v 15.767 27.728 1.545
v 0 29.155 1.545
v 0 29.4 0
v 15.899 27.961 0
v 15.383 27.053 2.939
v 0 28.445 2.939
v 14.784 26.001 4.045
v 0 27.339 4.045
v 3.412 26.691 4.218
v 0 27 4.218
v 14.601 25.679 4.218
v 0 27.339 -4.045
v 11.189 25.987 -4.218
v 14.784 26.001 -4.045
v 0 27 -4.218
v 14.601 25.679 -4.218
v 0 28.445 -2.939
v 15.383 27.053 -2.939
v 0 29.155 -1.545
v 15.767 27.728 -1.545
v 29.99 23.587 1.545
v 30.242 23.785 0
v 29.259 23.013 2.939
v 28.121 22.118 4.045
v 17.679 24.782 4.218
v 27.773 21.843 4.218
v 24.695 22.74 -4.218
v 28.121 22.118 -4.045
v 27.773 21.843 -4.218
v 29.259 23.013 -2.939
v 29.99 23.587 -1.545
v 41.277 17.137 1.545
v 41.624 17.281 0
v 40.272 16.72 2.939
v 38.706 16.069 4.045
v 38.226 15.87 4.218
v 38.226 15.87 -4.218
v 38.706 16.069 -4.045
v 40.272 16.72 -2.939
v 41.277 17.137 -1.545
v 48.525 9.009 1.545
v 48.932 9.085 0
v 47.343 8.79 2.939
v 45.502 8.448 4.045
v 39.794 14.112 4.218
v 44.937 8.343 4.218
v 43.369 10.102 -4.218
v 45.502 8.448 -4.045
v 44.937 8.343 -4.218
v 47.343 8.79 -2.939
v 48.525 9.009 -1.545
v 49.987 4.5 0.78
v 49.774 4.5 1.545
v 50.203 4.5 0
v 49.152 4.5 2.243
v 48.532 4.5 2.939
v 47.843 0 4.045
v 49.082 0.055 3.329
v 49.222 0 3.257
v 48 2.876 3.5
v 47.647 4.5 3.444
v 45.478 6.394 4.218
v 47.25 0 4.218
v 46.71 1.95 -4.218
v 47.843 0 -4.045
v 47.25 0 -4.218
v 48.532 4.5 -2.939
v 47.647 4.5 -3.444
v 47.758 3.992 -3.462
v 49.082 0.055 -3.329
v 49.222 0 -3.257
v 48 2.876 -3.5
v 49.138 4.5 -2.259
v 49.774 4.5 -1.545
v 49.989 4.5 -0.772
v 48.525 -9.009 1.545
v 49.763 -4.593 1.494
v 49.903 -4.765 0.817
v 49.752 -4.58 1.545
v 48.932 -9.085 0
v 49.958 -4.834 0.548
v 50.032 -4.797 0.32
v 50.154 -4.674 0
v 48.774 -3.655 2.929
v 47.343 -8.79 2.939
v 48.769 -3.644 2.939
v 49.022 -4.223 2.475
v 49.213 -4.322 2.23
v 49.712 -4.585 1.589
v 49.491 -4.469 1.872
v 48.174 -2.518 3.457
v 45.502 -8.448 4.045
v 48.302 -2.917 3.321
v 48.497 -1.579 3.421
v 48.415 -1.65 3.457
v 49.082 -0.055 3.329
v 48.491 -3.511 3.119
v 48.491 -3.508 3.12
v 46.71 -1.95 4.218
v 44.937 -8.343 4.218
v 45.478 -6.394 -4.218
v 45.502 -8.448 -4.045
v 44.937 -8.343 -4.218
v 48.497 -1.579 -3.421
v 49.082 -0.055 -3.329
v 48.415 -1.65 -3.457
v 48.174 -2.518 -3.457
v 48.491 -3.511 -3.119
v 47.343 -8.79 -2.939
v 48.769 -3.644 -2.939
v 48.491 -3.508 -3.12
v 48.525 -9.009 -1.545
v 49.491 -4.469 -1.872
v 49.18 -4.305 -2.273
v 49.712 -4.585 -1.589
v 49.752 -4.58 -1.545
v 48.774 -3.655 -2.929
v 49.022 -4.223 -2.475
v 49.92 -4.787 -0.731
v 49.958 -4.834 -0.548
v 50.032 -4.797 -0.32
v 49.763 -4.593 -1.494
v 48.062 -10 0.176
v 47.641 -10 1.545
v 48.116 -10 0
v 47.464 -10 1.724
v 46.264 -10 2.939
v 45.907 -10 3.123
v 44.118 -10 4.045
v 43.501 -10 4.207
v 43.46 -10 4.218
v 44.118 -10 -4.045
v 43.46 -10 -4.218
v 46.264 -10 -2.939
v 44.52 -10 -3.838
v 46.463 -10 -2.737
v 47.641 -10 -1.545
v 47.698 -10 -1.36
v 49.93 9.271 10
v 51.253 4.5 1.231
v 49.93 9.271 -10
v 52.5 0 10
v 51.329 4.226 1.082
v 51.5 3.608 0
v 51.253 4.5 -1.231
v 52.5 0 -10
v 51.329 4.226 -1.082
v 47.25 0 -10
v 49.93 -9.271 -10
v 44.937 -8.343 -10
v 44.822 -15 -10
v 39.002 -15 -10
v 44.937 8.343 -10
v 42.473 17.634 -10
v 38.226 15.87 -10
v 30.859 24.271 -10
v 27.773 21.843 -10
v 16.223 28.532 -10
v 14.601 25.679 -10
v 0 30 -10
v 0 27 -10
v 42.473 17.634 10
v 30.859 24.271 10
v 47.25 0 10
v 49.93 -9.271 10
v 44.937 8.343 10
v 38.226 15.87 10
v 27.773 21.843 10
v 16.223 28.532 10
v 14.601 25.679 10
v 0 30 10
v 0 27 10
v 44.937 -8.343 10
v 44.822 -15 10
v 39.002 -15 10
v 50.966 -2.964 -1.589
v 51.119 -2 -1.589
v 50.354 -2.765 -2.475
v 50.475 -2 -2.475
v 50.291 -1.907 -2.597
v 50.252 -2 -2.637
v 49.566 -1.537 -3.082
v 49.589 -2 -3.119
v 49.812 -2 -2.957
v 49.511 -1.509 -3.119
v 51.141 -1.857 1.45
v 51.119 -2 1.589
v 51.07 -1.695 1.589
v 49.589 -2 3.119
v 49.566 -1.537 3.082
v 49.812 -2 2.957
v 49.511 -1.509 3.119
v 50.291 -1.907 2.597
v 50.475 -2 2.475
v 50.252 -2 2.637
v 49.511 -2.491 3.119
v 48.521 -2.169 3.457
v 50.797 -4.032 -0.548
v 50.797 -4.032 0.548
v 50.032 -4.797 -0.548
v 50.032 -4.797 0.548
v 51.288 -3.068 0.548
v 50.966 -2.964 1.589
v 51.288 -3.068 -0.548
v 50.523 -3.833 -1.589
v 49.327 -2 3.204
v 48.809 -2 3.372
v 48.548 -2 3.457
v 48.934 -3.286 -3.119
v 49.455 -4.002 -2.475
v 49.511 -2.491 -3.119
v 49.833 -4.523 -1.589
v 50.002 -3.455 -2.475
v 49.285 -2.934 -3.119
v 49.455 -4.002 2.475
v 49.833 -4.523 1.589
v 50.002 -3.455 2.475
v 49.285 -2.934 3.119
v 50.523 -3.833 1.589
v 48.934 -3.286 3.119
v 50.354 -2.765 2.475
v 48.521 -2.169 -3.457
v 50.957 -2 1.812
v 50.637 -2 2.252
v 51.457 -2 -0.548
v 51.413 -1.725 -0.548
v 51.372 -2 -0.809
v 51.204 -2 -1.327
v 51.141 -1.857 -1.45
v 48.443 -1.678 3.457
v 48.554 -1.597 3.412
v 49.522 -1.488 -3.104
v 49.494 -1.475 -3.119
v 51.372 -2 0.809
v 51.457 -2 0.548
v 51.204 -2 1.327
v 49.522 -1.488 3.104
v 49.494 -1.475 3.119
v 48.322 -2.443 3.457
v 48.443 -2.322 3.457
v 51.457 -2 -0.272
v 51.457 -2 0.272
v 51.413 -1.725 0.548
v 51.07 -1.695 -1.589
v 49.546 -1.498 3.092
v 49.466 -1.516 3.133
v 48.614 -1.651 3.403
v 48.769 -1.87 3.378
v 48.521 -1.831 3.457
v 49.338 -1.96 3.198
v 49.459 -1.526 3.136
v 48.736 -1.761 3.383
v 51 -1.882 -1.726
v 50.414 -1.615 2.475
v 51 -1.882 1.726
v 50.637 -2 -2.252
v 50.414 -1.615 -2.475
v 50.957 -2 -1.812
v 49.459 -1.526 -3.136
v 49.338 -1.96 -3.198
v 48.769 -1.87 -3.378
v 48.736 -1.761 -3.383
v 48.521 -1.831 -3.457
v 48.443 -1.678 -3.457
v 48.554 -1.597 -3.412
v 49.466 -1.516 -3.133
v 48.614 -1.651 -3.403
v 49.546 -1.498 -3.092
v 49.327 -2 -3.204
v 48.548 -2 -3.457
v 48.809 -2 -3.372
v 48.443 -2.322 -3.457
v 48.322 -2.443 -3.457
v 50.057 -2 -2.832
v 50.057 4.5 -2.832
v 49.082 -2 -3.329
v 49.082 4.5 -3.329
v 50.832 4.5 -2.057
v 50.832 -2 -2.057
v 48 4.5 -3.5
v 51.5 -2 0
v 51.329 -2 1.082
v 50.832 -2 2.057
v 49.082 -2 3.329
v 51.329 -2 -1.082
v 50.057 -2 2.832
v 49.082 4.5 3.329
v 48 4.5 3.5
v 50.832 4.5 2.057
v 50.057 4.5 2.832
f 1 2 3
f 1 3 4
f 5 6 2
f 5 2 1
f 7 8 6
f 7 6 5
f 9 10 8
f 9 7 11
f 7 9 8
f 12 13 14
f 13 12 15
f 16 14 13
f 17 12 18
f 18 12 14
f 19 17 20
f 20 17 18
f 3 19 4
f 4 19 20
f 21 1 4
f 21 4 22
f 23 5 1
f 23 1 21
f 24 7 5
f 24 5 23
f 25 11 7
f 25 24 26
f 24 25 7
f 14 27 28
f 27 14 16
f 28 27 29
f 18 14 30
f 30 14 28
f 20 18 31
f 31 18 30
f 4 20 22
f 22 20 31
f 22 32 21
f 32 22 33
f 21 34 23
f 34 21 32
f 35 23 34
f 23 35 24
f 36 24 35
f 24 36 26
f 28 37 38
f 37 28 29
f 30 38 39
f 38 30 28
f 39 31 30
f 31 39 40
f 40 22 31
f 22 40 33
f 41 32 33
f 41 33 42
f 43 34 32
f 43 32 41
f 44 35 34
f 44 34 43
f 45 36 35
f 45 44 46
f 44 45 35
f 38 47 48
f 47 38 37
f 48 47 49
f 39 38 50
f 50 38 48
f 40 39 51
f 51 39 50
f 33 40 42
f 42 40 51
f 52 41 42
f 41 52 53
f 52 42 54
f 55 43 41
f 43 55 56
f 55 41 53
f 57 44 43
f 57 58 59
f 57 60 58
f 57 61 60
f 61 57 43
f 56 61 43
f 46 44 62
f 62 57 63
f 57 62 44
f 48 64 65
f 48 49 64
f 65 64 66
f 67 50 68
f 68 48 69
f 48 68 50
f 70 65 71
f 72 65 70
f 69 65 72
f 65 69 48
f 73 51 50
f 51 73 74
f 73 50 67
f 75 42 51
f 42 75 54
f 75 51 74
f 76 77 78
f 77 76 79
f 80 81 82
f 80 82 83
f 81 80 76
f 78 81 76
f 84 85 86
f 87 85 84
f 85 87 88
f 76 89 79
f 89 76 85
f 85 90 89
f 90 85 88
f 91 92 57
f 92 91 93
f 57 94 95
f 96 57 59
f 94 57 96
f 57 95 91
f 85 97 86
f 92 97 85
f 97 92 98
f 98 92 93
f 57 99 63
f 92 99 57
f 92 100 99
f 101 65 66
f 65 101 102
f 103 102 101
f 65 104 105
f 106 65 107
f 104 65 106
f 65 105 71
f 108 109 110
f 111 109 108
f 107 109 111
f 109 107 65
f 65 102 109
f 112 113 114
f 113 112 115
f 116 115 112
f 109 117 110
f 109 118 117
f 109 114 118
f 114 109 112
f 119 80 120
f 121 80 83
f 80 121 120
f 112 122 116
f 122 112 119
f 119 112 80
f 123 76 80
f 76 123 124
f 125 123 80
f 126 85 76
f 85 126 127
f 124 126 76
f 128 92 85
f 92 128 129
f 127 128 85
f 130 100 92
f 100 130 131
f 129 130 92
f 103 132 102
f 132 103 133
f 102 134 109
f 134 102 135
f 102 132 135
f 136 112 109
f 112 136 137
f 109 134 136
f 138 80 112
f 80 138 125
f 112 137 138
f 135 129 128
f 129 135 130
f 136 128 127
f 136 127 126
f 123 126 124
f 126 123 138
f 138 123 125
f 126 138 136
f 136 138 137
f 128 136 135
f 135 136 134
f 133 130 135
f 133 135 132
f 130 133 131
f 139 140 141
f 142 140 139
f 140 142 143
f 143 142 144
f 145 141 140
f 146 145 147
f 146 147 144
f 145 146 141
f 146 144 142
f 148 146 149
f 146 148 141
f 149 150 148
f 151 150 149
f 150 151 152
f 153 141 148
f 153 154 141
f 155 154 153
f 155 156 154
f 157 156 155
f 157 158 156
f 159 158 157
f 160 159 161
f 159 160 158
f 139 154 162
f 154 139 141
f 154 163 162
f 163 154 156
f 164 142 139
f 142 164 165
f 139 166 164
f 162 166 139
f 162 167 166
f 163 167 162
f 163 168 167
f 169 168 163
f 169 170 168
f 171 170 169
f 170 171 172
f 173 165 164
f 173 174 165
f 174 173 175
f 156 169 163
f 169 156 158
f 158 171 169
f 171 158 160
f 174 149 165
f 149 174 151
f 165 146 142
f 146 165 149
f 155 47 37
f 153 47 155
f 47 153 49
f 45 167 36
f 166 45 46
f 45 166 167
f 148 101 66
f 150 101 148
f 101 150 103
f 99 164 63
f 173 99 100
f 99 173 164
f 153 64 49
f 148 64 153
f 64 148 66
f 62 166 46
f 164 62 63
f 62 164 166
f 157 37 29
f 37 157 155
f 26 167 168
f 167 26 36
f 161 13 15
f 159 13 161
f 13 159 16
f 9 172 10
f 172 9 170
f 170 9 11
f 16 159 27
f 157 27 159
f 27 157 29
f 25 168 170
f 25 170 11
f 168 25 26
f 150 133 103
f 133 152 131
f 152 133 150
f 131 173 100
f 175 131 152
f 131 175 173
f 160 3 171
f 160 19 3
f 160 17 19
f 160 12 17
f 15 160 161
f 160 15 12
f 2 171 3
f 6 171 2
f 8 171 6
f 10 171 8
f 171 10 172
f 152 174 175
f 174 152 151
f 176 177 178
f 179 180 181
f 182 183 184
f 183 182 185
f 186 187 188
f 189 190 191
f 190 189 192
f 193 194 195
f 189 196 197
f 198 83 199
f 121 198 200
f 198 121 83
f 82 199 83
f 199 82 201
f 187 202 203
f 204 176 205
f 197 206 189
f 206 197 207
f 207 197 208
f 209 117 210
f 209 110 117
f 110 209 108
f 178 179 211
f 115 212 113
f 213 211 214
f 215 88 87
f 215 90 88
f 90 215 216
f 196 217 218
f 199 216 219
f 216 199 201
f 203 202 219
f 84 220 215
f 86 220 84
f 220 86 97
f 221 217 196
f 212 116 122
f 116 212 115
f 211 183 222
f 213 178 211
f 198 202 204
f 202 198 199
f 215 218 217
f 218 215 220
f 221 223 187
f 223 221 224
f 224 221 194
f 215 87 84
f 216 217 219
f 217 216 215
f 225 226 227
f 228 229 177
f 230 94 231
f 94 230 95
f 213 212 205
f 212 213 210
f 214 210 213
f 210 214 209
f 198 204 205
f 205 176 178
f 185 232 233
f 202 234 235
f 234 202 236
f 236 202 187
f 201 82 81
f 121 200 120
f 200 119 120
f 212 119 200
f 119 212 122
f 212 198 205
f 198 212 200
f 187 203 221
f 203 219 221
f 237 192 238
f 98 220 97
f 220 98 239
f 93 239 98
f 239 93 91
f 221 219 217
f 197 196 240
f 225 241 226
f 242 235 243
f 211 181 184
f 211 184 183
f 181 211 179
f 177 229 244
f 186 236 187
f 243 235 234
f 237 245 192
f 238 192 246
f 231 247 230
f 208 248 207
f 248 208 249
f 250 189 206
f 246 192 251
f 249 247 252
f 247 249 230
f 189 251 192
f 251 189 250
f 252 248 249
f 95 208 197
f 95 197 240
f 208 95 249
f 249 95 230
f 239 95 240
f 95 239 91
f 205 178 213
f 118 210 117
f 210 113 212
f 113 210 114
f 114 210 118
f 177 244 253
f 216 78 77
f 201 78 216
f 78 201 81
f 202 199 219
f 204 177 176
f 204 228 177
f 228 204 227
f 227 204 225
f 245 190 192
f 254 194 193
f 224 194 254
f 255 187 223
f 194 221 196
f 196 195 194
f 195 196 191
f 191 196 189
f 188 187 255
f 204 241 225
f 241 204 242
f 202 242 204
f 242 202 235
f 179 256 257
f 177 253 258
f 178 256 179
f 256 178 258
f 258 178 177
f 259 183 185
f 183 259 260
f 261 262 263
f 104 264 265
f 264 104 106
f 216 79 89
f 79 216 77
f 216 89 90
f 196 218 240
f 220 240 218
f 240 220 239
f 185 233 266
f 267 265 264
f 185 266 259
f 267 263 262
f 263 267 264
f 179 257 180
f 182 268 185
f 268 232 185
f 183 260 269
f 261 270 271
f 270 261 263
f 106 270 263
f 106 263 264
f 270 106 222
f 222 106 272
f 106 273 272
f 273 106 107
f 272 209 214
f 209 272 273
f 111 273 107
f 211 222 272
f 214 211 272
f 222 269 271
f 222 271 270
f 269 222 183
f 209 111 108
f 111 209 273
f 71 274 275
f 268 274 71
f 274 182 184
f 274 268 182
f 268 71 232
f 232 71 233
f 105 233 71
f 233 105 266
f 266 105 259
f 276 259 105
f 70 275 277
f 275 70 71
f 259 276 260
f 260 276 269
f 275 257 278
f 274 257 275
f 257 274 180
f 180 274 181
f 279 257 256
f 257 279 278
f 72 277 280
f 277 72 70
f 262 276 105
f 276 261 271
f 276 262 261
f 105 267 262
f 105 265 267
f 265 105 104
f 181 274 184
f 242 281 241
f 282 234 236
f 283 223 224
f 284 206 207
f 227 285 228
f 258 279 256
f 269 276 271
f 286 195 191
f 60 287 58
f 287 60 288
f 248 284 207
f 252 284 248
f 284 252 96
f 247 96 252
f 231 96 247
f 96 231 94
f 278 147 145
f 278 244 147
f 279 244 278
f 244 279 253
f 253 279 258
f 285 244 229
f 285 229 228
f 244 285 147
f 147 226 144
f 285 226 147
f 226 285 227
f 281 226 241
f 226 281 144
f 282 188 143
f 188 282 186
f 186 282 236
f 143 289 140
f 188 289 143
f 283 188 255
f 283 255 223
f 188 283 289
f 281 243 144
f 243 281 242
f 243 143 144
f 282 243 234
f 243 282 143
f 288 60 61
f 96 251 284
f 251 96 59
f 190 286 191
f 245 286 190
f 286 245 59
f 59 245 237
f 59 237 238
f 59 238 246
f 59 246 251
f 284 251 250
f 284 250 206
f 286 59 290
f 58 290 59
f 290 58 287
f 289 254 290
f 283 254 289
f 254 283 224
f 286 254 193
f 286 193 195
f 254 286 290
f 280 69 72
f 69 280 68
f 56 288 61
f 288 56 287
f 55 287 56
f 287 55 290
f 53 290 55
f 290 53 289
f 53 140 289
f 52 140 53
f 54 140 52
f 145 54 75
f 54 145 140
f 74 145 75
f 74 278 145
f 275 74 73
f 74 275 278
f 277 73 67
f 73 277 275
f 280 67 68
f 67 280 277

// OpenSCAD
$fn=20;

module torus(r1,r2){
	rotate_extrude() translate([r1, 0]) circle(r=r2);
}

module curve(){
	scale([1.75,1])
	intersection(){
			
		difference(){
			cylinder(h=20,r=30,center=true);
			cylinder(h=20.1,r=27,center=true);
			intersection(){
				torus(24.4,5);
				translate([-0.1,-10,-5]) cube([35,40,15]);
			}
		}
			translate([0,-15,-10]) cube([40,60,20]);
	}
}

module led(height,width){
	cylinder_h=height-width/2;
	translate([0,0,0])
	sphere(width/2);
	translate([-cylinder_h/2,0,0])
	rotate([0,90,0])
	cylinder(h=cylinder_h,r=width/2,center=true);
}

difference() {
	curve();
	color("red") translate([48,-2,0]) 
	rotate([0,0,-90])
	led(10,7);
}
